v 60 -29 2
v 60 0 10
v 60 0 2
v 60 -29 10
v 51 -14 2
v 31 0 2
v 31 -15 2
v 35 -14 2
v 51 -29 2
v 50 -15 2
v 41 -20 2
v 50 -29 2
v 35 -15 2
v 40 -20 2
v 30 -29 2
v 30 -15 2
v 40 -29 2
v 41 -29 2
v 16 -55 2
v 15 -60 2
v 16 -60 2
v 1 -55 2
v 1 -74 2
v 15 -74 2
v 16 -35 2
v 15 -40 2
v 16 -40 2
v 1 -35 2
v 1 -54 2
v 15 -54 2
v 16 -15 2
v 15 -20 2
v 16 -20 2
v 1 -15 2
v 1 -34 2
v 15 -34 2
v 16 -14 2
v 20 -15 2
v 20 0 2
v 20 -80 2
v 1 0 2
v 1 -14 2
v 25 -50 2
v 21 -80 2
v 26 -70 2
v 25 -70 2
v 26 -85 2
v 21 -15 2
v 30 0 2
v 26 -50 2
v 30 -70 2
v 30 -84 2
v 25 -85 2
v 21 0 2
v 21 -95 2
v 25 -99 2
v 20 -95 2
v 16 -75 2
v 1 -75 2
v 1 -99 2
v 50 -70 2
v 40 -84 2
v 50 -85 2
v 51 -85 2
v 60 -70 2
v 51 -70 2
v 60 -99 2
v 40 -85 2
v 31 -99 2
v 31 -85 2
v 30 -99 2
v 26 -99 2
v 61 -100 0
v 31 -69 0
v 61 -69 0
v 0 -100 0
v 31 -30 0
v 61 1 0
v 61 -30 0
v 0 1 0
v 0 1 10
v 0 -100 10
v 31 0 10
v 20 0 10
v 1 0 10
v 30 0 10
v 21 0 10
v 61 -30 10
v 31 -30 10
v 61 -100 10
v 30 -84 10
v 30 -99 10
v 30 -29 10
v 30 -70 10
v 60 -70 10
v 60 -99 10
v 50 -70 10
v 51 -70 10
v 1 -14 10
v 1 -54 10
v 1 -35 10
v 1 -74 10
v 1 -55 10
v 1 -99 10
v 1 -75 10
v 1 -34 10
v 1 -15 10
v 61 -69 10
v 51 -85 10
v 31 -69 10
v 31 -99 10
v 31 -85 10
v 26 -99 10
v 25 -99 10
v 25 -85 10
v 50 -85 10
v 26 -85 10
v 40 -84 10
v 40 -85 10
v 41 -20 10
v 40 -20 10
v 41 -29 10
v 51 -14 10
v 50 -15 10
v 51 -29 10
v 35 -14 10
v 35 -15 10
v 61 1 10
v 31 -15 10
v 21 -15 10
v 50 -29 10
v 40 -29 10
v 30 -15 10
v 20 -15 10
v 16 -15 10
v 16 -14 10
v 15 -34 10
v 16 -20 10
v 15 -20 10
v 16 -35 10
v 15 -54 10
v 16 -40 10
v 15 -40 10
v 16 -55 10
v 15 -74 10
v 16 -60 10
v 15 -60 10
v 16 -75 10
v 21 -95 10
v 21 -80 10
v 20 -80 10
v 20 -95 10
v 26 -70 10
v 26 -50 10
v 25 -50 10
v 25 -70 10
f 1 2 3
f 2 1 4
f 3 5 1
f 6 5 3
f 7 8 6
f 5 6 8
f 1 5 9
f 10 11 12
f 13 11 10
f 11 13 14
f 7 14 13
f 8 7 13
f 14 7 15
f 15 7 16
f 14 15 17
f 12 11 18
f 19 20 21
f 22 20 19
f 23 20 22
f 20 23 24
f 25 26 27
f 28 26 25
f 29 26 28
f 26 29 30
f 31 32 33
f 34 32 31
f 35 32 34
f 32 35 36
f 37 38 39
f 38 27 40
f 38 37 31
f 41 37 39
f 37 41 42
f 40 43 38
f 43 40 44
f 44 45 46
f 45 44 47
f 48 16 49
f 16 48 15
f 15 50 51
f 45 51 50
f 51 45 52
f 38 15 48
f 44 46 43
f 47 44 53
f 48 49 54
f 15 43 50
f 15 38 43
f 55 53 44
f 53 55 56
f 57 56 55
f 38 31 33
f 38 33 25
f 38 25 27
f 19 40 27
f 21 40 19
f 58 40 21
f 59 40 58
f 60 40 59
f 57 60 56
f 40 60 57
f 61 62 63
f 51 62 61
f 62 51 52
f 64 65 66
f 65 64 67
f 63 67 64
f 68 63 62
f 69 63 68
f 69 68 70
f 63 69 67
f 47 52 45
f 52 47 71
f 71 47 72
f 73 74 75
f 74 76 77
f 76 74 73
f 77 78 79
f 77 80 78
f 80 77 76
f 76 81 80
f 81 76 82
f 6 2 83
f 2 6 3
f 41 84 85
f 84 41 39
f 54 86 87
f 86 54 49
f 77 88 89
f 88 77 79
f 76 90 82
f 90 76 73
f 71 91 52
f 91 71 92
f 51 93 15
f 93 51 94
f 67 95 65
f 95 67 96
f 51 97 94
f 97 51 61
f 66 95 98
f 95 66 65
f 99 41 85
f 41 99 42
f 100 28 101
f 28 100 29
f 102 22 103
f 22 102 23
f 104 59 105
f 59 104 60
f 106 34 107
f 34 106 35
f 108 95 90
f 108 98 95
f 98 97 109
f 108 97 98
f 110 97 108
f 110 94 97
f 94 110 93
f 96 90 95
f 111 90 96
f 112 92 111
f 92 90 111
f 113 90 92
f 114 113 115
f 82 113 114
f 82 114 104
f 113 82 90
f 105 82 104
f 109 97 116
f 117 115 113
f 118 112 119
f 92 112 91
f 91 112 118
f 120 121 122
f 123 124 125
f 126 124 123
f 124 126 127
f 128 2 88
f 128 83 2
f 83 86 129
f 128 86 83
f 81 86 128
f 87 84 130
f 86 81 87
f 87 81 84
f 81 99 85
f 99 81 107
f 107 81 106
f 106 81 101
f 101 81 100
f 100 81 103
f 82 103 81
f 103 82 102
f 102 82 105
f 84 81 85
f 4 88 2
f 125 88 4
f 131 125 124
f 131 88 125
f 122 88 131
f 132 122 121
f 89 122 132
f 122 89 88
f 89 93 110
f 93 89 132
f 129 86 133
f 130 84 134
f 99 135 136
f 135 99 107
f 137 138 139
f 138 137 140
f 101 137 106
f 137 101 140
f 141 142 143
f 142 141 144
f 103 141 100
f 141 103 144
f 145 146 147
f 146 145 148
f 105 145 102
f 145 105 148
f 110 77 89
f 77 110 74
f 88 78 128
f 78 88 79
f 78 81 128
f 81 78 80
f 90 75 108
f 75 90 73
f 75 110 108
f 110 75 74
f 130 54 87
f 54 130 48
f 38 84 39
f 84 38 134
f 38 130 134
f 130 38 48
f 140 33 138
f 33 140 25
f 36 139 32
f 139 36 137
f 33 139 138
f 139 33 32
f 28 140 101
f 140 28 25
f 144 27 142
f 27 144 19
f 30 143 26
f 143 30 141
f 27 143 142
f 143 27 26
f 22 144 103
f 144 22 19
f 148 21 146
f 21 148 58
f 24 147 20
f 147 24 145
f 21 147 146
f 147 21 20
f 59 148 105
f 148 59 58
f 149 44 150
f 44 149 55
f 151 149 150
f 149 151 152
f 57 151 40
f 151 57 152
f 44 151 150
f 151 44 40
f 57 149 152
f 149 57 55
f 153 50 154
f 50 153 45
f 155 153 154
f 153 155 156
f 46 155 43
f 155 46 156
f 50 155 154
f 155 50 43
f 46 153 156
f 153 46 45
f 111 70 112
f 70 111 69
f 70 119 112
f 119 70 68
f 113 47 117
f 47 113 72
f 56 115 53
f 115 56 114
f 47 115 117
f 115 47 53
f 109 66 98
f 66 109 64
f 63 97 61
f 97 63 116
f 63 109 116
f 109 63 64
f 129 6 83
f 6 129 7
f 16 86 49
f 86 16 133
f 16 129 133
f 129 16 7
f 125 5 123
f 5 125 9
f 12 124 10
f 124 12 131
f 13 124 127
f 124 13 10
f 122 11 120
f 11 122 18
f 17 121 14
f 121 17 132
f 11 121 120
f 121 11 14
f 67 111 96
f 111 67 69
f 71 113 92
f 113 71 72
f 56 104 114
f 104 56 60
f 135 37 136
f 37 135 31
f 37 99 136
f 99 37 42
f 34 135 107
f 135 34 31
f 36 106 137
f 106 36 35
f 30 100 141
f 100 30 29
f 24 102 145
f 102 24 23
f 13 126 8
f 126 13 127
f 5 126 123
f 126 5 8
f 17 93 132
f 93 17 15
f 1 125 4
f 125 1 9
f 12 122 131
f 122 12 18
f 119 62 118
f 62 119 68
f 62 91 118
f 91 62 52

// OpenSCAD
//4 этаж

{translate([0,-30,0])
cube([60,30,2]);
translate([0,0,0])
rotate([0,0,270])
cube([100,30,2]);
translate([0,-100,0])
cube([60,30,2]);
}
{
translate([0,-100,0])
cube([1,100,10]);
translate([30,-70,0])
cube([1,40,10]);
translate([60,-30,0])
cube([1,31,10]);
translate([60,-100,0])
cube([1,31,10]);
translate([20,-15,0])
cube([1,15,10]);
translate([15,-35,0])
cube([1,15,10]);
translate([15,-55,0])
cube([1,15,10]);
translate([15,-75,0])
cube([1,15,10]);
translate([20,-95,0])
cube([1,15,10]);
translate([25,-70,0])
cube([1,20,10]);
translate([30,-100,0])
cube([1,15,10]);
translate([25,-100,0])
cube([1,15,10]);
translate([50,-85,0])
cube([1,15,10]);
translate([30,-15,0])
cube([1,15,10]);
translate([50,-30,0])
cube([1,15,10]);
translate([40,-30,0])
cube([1,10,10]);
}
{
translate([0,0,0])
cube([60,1,10]);
translate([0,-100,0])
cube([60,1,10]);
translate([0,-15,0])
cube([16,1,10]);
translate([0,-35,0])
cube([16,1,10]);
translate([0,-55,0])
cube([16,1,10]);
translate([0,-75,0])
cube([16,1,10]);
translate([35,-15,0])
cube([16,1,10]);
translate([30,-30,0])
cube([30,1,10]);
translate([30,-70,0])
cube([30,1,10]);
translate([30,-85,0])
cube([10,1,10]);



}
